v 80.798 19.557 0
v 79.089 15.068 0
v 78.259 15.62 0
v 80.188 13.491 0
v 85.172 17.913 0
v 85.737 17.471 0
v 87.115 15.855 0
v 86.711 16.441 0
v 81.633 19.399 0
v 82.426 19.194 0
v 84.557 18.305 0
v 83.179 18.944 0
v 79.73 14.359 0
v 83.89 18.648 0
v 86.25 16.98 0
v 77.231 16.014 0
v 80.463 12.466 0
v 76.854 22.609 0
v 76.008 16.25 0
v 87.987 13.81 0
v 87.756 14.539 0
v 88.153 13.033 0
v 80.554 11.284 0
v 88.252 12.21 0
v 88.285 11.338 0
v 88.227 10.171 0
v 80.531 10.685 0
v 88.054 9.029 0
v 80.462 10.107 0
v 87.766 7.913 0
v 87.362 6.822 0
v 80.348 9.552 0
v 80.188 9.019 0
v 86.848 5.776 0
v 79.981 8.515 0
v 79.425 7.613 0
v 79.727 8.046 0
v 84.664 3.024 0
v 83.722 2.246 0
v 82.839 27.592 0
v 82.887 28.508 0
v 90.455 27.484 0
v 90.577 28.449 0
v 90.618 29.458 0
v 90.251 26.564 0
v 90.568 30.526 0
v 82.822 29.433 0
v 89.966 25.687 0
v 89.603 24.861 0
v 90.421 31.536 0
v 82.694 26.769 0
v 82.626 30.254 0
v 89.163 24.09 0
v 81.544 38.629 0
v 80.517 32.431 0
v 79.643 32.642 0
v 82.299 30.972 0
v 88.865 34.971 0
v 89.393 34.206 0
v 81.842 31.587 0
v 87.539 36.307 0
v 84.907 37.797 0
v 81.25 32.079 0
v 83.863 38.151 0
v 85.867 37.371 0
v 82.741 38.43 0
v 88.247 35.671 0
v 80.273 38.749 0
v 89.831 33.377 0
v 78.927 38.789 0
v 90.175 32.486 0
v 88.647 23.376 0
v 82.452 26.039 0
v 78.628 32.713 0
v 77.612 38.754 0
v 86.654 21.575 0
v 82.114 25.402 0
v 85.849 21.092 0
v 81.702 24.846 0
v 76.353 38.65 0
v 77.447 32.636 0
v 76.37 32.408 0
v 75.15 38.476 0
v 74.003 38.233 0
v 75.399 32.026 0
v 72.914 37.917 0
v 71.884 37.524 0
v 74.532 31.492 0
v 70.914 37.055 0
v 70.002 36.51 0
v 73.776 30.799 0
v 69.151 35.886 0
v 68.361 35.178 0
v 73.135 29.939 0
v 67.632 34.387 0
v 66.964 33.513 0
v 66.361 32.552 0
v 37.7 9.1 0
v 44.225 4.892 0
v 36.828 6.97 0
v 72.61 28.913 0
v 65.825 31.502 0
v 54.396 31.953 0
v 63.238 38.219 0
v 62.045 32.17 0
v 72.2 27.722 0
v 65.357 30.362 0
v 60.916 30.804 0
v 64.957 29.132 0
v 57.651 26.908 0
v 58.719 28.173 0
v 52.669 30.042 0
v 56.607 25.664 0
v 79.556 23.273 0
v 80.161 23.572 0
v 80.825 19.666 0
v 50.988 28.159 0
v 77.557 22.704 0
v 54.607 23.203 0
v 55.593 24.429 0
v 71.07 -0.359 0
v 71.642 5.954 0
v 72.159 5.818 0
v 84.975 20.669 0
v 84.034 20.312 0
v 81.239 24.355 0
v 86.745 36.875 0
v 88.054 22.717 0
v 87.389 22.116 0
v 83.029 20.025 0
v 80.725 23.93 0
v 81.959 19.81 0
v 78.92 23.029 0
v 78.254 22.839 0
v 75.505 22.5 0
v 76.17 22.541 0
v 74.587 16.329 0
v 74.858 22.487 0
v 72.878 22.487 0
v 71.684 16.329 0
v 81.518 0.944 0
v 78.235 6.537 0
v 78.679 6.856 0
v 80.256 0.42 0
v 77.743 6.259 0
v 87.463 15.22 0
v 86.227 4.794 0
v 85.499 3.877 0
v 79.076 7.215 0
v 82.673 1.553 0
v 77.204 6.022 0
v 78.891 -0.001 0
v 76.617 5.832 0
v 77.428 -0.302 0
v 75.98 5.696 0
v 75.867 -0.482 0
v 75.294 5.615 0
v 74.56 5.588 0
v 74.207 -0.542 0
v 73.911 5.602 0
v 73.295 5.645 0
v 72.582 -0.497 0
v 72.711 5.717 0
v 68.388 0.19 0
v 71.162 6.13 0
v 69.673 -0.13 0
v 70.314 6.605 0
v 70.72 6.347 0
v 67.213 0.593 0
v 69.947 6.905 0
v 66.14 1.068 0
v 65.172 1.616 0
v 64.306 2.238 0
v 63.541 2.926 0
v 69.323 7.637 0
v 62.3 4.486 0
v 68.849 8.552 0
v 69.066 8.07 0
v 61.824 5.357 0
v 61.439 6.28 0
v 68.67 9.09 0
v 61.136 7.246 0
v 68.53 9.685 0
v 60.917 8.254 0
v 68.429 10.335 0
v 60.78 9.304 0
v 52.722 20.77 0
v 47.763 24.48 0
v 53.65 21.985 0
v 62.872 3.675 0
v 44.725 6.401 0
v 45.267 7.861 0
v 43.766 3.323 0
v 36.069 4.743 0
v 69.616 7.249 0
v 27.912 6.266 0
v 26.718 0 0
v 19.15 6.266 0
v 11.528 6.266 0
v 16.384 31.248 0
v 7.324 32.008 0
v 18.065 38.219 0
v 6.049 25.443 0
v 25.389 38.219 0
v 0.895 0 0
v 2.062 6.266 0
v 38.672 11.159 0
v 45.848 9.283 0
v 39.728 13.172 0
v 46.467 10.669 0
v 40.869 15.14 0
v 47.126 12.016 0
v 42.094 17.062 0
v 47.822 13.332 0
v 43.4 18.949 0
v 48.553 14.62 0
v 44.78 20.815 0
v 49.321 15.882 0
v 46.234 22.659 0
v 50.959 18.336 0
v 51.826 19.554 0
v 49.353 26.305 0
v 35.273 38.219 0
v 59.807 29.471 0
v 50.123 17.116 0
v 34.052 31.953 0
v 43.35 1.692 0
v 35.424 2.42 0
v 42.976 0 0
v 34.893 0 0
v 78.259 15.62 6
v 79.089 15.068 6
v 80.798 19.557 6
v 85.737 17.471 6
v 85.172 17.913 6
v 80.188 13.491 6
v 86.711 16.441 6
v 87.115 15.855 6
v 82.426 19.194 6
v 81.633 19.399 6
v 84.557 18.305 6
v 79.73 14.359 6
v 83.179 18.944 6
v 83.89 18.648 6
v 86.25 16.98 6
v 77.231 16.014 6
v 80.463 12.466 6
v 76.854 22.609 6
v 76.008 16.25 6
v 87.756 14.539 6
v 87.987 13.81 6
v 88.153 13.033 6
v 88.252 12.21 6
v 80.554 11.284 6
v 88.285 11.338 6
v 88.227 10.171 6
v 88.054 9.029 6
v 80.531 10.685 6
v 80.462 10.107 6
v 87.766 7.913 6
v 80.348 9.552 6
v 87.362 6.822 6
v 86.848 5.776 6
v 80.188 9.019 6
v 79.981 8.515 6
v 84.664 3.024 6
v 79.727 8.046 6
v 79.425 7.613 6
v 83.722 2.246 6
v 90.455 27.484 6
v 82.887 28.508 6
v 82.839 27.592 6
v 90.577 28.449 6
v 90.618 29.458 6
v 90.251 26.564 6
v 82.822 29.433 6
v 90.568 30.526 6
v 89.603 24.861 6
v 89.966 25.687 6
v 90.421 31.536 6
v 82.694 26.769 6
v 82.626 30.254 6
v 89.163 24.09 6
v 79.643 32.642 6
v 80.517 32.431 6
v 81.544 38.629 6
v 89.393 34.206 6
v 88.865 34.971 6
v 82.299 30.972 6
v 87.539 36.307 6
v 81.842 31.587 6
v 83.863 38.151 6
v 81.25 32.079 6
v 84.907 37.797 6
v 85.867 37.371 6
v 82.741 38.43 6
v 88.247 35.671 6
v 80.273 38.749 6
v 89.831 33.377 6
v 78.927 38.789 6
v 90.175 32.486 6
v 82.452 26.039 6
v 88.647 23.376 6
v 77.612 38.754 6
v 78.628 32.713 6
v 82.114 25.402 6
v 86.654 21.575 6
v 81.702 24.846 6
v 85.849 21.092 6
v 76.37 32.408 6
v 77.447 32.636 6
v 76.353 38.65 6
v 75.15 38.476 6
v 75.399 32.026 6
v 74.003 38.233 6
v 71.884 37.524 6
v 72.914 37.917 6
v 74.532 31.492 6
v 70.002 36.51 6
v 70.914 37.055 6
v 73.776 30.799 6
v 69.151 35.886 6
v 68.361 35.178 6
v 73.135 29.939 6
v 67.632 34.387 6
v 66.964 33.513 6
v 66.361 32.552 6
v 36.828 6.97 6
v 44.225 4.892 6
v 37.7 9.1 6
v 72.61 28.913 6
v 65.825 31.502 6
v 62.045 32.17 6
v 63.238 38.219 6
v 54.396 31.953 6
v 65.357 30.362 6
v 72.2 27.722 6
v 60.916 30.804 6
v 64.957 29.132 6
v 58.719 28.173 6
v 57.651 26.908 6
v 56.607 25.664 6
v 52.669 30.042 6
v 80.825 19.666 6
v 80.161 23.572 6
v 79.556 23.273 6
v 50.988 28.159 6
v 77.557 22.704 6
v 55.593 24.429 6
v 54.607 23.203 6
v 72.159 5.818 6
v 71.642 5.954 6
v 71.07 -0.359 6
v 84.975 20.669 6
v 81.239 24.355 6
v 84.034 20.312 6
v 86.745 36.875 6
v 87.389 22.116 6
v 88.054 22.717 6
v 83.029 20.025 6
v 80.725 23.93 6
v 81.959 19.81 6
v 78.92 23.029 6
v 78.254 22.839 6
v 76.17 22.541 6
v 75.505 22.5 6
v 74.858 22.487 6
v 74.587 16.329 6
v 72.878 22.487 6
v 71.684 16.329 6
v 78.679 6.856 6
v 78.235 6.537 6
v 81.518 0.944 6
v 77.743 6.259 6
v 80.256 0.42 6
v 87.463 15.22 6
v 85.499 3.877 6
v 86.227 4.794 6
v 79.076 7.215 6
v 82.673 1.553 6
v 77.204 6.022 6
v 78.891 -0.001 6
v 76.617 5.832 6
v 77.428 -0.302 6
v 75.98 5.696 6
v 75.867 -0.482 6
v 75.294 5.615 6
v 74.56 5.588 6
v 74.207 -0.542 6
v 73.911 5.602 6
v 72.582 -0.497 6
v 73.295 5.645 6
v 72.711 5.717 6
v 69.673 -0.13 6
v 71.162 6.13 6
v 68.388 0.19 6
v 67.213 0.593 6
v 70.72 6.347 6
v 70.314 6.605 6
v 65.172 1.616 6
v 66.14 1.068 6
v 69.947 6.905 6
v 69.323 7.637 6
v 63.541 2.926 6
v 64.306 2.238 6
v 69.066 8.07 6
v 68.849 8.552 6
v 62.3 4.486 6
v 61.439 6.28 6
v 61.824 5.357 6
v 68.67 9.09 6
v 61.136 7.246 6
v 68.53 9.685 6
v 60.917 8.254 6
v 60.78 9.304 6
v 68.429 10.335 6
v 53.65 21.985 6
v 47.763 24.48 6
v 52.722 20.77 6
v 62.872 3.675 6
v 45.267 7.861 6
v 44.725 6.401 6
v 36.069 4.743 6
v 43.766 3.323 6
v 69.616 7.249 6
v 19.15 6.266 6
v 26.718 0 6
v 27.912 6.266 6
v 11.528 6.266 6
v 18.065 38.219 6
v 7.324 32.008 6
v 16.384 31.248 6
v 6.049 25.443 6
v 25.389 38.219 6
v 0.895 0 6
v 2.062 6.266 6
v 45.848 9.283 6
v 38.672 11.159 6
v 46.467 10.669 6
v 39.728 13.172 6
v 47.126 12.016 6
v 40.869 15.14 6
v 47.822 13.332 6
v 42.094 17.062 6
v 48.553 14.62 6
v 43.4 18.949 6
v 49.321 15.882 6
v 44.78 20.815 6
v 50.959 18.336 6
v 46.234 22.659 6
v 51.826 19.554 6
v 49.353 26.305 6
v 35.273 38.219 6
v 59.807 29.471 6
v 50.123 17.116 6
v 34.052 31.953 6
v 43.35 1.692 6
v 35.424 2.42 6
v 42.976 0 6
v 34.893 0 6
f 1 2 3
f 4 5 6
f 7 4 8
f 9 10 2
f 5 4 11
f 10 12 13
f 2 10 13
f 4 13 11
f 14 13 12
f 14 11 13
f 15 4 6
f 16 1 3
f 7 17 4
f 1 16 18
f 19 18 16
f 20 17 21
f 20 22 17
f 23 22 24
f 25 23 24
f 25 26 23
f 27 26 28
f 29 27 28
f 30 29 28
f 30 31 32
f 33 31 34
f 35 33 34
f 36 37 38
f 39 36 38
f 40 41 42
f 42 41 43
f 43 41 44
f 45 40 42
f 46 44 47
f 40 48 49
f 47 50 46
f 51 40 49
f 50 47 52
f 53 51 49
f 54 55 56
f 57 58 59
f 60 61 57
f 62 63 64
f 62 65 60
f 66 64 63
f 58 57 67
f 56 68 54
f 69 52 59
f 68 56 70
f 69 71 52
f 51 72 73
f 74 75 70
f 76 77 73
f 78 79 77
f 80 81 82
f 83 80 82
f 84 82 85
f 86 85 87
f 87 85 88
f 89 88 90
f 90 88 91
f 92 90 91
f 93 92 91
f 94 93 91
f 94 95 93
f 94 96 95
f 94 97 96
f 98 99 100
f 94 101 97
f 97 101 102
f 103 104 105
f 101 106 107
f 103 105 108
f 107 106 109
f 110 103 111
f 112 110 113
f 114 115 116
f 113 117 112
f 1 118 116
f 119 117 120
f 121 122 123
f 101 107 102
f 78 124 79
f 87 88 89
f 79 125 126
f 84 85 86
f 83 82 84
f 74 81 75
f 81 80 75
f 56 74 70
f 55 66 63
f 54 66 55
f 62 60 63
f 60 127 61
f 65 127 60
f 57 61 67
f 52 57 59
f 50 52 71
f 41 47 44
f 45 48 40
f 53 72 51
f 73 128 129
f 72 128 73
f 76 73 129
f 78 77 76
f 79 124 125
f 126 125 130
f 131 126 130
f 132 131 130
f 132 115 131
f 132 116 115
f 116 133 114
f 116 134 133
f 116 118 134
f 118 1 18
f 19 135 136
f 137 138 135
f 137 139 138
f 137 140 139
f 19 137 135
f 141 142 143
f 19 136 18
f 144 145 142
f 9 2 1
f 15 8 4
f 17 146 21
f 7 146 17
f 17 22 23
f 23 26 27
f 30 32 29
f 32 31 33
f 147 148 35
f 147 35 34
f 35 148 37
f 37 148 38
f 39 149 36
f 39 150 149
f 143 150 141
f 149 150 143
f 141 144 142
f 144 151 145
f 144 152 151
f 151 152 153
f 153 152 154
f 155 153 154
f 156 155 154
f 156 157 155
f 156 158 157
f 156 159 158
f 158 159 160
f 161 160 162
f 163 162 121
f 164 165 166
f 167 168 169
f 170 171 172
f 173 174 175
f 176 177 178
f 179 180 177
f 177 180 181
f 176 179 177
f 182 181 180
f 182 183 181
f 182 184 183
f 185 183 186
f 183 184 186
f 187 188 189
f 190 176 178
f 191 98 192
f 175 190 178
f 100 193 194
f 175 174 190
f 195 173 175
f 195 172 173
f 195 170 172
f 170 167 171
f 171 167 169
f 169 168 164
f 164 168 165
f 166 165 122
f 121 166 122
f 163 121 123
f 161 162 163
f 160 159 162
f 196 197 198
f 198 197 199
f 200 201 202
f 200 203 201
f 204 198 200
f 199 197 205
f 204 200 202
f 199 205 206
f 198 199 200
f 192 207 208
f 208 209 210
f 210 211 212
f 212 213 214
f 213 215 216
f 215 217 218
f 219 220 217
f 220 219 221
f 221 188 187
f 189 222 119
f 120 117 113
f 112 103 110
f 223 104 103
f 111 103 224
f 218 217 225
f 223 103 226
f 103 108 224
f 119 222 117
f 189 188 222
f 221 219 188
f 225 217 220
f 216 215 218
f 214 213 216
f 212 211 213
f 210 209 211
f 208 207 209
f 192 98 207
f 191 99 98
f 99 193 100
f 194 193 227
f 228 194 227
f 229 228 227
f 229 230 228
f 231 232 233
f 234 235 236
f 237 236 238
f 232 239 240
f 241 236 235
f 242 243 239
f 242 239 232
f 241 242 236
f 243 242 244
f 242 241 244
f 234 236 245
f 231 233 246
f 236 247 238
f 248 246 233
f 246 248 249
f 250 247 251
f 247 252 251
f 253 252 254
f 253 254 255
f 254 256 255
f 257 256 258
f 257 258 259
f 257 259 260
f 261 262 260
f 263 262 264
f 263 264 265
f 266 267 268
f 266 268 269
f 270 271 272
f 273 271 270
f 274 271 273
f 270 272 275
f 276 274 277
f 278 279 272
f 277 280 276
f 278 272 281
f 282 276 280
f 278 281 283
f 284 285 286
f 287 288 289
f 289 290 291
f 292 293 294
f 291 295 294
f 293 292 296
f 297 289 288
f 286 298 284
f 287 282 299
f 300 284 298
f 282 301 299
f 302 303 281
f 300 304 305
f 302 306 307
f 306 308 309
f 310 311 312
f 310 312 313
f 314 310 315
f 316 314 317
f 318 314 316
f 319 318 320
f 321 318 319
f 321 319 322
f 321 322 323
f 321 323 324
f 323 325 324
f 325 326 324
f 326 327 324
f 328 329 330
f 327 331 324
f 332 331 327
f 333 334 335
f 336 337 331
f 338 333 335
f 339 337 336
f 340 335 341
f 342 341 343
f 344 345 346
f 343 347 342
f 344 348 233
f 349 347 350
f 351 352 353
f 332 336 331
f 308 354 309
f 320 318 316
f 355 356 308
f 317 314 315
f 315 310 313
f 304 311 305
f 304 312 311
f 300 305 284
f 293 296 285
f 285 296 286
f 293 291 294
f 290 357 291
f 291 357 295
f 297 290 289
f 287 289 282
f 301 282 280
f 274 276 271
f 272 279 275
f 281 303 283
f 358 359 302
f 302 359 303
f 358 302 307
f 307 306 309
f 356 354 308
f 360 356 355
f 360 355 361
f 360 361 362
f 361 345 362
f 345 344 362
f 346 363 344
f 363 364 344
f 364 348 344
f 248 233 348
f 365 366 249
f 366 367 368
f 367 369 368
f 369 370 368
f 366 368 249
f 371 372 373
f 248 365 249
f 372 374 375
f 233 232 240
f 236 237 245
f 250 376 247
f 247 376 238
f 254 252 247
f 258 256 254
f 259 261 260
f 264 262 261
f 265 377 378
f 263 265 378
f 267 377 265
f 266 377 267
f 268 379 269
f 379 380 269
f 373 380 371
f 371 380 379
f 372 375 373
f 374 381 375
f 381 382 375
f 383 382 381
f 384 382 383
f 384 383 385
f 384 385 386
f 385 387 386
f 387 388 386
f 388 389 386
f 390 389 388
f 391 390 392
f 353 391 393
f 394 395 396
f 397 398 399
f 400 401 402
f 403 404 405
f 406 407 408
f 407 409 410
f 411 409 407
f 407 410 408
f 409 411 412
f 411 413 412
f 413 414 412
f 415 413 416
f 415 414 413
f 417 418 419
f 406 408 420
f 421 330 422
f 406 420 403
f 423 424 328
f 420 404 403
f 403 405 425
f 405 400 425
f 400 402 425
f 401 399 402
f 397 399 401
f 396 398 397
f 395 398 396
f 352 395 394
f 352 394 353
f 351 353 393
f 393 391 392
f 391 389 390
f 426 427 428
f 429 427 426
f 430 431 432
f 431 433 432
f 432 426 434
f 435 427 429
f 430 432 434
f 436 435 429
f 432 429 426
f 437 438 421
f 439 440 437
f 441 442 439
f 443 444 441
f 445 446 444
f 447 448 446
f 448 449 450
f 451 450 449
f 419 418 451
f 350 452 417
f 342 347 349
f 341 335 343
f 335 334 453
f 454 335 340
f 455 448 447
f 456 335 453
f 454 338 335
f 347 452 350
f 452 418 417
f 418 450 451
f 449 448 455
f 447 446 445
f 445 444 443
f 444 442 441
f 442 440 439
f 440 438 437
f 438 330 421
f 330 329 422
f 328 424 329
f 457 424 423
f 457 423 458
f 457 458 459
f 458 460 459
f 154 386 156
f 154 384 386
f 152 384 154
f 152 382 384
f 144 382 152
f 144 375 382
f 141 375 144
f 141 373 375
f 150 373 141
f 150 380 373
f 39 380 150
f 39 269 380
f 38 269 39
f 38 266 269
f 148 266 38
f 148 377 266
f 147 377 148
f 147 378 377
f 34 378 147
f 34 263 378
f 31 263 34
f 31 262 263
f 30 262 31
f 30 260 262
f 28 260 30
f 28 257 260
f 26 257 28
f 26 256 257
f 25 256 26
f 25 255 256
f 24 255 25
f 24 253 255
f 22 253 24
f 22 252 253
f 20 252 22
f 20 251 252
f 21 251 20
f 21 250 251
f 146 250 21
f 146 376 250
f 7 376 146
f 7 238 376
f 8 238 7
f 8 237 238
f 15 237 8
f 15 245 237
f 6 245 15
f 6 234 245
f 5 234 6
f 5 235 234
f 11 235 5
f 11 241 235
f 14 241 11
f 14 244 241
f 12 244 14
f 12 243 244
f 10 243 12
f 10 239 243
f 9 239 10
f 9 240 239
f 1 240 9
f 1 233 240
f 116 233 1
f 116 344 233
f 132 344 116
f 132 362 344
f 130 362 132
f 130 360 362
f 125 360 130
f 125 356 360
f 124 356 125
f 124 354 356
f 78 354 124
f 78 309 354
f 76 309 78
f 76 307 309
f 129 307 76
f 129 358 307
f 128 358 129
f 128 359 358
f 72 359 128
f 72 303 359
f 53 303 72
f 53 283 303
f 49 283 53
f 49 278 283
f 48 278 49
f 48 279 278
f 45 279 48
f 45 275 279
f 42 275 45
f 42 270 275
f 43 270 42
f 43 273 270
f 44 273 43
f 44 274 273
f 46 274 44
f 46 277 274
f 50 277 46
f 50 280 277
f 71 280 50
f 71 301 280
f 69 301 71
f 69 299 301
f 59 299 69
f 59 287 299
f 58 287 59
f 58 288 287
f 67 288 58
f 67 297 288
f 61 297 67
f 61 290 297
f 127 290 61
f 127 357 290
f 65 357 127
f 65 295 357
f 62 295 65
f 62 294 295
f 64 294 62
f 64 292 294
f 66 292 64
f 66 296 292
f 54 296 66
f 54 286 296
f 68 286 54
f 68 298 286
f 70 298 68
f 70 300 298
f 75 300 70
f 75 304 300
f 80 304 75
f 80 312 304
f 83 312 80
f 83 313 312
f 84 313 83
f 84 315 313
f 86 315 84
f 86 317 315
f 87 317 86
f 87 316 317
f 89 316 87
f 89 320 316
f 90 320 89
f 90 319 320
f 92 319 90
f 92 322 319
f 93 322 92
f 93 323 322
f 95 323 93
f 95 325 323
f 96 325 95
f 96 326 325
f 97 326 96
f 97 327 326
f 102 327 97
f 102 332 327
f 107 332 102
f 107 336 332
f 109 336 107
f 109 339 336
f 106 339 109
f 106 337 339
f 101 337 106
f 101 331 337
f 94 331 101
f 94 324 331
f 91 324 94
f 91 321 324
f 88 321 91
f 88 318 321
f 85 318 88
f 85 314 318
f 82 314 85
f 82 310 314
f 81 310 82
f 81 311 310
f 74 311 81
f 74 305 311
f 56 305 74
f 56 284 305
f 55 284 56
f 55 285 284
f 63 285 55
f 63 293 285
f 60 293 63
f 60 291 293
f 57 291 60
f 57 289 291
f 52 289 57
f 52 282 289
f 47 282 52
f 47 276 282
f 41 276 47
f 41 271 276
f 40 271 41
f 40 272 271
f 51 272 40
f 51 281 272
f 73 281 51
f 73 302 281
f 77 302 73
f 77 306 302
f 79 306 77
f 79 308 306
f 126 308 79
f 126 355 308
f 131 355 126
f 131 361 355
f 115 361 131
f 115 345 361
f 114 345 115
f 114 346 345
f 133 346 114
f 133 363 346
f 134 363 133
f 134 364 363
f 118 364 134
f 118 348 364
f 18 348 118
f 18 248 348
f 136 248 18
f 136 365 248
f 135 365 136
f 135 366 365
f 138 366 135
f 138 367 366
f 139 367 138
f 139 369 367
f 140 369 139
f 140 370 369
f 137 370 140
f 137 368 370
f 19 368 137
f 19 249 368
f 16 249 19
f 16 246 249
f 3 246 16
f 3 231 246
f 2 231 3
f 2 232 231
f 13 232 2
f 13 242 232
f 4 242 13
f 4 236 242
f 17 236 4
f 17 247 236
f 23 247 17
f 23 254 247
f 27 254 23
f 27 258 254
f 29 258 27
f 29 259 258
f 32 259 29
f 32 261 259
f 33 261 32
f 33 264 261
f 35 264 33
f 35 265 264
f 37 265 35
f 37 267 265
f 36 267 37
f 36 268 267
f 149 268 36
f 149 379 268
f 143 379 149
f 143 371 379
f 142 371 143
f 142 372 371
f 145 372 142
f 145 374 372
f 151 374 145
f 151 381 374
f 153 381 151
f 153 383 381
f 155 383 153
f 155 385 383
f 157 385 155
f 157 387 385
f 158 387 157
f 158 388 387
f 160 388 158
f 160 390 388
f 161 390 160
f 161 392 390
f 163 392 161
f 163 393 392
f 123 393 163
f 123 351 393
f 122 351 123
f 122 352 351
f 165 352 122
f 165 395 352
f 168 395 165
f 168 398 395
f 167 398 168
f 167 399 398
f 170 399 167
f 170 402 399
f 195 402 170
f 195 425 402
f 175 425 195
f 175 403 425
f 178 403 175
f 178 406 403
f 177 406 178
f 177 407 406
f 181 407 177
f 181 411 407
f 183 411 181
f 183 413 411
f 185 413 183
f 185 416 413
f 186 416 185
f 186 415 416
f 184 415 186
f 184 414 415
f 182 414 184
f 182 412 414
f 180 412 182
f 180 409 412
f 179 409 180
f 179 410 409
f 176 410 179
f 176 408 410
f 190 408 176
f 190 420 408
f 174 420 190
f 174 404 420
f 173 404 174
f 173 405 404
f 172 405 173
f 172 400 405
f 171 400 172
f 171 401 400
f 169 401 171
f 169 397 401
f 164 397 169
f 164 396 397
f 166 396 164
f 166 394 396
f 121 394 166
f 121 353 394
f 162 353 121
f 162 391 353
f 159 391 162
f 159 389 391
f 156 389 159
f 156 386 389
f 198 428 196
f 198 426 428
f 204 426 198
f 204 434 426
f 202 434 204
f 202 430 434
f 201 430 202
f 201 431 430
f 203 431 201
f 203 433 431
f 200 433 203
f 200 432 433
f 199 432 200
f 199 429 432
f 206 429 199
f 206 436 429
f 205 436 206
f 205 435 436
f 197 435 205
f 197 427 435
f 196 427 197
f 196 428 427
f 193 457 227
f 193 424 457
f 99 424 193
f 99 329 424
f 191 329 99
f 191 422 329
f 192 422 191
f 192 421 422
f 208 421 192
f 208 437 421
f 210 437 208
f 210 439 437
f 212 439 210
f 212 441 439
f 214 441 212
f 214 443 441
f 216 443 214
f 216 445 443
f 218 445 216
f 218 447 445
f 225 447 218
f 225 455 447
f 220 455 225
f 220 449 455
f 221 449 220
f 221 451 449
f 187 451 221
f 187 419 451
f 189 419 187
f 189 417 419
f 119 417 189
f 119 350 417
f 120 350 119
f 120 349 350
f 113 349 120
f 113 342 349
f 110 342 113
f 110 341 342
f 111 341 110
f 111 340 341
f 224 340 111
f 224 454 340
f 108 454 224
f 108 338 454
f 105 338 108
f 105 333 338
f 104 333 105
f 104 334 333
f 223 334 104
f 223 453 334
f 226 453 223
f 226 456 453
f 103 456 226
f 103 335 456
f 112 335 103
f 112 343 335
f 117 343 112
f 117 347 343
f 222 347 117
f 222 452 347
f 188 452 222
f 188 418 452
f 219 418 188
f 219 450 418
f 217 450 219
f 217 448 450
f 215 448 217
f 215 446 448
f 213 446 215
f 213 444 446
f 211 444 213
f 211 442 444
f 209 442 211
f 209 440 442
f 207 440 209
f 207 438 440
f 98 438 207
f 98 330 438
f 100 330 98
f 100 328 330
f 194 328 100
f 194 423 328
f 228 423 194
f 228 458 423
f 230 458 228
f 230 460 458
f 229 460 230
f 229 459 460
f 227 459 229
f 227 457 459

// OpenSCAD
scale (4) linear_extrude(1.5)
text("173", font = "Liberation Sans:style=Bold Italic");
